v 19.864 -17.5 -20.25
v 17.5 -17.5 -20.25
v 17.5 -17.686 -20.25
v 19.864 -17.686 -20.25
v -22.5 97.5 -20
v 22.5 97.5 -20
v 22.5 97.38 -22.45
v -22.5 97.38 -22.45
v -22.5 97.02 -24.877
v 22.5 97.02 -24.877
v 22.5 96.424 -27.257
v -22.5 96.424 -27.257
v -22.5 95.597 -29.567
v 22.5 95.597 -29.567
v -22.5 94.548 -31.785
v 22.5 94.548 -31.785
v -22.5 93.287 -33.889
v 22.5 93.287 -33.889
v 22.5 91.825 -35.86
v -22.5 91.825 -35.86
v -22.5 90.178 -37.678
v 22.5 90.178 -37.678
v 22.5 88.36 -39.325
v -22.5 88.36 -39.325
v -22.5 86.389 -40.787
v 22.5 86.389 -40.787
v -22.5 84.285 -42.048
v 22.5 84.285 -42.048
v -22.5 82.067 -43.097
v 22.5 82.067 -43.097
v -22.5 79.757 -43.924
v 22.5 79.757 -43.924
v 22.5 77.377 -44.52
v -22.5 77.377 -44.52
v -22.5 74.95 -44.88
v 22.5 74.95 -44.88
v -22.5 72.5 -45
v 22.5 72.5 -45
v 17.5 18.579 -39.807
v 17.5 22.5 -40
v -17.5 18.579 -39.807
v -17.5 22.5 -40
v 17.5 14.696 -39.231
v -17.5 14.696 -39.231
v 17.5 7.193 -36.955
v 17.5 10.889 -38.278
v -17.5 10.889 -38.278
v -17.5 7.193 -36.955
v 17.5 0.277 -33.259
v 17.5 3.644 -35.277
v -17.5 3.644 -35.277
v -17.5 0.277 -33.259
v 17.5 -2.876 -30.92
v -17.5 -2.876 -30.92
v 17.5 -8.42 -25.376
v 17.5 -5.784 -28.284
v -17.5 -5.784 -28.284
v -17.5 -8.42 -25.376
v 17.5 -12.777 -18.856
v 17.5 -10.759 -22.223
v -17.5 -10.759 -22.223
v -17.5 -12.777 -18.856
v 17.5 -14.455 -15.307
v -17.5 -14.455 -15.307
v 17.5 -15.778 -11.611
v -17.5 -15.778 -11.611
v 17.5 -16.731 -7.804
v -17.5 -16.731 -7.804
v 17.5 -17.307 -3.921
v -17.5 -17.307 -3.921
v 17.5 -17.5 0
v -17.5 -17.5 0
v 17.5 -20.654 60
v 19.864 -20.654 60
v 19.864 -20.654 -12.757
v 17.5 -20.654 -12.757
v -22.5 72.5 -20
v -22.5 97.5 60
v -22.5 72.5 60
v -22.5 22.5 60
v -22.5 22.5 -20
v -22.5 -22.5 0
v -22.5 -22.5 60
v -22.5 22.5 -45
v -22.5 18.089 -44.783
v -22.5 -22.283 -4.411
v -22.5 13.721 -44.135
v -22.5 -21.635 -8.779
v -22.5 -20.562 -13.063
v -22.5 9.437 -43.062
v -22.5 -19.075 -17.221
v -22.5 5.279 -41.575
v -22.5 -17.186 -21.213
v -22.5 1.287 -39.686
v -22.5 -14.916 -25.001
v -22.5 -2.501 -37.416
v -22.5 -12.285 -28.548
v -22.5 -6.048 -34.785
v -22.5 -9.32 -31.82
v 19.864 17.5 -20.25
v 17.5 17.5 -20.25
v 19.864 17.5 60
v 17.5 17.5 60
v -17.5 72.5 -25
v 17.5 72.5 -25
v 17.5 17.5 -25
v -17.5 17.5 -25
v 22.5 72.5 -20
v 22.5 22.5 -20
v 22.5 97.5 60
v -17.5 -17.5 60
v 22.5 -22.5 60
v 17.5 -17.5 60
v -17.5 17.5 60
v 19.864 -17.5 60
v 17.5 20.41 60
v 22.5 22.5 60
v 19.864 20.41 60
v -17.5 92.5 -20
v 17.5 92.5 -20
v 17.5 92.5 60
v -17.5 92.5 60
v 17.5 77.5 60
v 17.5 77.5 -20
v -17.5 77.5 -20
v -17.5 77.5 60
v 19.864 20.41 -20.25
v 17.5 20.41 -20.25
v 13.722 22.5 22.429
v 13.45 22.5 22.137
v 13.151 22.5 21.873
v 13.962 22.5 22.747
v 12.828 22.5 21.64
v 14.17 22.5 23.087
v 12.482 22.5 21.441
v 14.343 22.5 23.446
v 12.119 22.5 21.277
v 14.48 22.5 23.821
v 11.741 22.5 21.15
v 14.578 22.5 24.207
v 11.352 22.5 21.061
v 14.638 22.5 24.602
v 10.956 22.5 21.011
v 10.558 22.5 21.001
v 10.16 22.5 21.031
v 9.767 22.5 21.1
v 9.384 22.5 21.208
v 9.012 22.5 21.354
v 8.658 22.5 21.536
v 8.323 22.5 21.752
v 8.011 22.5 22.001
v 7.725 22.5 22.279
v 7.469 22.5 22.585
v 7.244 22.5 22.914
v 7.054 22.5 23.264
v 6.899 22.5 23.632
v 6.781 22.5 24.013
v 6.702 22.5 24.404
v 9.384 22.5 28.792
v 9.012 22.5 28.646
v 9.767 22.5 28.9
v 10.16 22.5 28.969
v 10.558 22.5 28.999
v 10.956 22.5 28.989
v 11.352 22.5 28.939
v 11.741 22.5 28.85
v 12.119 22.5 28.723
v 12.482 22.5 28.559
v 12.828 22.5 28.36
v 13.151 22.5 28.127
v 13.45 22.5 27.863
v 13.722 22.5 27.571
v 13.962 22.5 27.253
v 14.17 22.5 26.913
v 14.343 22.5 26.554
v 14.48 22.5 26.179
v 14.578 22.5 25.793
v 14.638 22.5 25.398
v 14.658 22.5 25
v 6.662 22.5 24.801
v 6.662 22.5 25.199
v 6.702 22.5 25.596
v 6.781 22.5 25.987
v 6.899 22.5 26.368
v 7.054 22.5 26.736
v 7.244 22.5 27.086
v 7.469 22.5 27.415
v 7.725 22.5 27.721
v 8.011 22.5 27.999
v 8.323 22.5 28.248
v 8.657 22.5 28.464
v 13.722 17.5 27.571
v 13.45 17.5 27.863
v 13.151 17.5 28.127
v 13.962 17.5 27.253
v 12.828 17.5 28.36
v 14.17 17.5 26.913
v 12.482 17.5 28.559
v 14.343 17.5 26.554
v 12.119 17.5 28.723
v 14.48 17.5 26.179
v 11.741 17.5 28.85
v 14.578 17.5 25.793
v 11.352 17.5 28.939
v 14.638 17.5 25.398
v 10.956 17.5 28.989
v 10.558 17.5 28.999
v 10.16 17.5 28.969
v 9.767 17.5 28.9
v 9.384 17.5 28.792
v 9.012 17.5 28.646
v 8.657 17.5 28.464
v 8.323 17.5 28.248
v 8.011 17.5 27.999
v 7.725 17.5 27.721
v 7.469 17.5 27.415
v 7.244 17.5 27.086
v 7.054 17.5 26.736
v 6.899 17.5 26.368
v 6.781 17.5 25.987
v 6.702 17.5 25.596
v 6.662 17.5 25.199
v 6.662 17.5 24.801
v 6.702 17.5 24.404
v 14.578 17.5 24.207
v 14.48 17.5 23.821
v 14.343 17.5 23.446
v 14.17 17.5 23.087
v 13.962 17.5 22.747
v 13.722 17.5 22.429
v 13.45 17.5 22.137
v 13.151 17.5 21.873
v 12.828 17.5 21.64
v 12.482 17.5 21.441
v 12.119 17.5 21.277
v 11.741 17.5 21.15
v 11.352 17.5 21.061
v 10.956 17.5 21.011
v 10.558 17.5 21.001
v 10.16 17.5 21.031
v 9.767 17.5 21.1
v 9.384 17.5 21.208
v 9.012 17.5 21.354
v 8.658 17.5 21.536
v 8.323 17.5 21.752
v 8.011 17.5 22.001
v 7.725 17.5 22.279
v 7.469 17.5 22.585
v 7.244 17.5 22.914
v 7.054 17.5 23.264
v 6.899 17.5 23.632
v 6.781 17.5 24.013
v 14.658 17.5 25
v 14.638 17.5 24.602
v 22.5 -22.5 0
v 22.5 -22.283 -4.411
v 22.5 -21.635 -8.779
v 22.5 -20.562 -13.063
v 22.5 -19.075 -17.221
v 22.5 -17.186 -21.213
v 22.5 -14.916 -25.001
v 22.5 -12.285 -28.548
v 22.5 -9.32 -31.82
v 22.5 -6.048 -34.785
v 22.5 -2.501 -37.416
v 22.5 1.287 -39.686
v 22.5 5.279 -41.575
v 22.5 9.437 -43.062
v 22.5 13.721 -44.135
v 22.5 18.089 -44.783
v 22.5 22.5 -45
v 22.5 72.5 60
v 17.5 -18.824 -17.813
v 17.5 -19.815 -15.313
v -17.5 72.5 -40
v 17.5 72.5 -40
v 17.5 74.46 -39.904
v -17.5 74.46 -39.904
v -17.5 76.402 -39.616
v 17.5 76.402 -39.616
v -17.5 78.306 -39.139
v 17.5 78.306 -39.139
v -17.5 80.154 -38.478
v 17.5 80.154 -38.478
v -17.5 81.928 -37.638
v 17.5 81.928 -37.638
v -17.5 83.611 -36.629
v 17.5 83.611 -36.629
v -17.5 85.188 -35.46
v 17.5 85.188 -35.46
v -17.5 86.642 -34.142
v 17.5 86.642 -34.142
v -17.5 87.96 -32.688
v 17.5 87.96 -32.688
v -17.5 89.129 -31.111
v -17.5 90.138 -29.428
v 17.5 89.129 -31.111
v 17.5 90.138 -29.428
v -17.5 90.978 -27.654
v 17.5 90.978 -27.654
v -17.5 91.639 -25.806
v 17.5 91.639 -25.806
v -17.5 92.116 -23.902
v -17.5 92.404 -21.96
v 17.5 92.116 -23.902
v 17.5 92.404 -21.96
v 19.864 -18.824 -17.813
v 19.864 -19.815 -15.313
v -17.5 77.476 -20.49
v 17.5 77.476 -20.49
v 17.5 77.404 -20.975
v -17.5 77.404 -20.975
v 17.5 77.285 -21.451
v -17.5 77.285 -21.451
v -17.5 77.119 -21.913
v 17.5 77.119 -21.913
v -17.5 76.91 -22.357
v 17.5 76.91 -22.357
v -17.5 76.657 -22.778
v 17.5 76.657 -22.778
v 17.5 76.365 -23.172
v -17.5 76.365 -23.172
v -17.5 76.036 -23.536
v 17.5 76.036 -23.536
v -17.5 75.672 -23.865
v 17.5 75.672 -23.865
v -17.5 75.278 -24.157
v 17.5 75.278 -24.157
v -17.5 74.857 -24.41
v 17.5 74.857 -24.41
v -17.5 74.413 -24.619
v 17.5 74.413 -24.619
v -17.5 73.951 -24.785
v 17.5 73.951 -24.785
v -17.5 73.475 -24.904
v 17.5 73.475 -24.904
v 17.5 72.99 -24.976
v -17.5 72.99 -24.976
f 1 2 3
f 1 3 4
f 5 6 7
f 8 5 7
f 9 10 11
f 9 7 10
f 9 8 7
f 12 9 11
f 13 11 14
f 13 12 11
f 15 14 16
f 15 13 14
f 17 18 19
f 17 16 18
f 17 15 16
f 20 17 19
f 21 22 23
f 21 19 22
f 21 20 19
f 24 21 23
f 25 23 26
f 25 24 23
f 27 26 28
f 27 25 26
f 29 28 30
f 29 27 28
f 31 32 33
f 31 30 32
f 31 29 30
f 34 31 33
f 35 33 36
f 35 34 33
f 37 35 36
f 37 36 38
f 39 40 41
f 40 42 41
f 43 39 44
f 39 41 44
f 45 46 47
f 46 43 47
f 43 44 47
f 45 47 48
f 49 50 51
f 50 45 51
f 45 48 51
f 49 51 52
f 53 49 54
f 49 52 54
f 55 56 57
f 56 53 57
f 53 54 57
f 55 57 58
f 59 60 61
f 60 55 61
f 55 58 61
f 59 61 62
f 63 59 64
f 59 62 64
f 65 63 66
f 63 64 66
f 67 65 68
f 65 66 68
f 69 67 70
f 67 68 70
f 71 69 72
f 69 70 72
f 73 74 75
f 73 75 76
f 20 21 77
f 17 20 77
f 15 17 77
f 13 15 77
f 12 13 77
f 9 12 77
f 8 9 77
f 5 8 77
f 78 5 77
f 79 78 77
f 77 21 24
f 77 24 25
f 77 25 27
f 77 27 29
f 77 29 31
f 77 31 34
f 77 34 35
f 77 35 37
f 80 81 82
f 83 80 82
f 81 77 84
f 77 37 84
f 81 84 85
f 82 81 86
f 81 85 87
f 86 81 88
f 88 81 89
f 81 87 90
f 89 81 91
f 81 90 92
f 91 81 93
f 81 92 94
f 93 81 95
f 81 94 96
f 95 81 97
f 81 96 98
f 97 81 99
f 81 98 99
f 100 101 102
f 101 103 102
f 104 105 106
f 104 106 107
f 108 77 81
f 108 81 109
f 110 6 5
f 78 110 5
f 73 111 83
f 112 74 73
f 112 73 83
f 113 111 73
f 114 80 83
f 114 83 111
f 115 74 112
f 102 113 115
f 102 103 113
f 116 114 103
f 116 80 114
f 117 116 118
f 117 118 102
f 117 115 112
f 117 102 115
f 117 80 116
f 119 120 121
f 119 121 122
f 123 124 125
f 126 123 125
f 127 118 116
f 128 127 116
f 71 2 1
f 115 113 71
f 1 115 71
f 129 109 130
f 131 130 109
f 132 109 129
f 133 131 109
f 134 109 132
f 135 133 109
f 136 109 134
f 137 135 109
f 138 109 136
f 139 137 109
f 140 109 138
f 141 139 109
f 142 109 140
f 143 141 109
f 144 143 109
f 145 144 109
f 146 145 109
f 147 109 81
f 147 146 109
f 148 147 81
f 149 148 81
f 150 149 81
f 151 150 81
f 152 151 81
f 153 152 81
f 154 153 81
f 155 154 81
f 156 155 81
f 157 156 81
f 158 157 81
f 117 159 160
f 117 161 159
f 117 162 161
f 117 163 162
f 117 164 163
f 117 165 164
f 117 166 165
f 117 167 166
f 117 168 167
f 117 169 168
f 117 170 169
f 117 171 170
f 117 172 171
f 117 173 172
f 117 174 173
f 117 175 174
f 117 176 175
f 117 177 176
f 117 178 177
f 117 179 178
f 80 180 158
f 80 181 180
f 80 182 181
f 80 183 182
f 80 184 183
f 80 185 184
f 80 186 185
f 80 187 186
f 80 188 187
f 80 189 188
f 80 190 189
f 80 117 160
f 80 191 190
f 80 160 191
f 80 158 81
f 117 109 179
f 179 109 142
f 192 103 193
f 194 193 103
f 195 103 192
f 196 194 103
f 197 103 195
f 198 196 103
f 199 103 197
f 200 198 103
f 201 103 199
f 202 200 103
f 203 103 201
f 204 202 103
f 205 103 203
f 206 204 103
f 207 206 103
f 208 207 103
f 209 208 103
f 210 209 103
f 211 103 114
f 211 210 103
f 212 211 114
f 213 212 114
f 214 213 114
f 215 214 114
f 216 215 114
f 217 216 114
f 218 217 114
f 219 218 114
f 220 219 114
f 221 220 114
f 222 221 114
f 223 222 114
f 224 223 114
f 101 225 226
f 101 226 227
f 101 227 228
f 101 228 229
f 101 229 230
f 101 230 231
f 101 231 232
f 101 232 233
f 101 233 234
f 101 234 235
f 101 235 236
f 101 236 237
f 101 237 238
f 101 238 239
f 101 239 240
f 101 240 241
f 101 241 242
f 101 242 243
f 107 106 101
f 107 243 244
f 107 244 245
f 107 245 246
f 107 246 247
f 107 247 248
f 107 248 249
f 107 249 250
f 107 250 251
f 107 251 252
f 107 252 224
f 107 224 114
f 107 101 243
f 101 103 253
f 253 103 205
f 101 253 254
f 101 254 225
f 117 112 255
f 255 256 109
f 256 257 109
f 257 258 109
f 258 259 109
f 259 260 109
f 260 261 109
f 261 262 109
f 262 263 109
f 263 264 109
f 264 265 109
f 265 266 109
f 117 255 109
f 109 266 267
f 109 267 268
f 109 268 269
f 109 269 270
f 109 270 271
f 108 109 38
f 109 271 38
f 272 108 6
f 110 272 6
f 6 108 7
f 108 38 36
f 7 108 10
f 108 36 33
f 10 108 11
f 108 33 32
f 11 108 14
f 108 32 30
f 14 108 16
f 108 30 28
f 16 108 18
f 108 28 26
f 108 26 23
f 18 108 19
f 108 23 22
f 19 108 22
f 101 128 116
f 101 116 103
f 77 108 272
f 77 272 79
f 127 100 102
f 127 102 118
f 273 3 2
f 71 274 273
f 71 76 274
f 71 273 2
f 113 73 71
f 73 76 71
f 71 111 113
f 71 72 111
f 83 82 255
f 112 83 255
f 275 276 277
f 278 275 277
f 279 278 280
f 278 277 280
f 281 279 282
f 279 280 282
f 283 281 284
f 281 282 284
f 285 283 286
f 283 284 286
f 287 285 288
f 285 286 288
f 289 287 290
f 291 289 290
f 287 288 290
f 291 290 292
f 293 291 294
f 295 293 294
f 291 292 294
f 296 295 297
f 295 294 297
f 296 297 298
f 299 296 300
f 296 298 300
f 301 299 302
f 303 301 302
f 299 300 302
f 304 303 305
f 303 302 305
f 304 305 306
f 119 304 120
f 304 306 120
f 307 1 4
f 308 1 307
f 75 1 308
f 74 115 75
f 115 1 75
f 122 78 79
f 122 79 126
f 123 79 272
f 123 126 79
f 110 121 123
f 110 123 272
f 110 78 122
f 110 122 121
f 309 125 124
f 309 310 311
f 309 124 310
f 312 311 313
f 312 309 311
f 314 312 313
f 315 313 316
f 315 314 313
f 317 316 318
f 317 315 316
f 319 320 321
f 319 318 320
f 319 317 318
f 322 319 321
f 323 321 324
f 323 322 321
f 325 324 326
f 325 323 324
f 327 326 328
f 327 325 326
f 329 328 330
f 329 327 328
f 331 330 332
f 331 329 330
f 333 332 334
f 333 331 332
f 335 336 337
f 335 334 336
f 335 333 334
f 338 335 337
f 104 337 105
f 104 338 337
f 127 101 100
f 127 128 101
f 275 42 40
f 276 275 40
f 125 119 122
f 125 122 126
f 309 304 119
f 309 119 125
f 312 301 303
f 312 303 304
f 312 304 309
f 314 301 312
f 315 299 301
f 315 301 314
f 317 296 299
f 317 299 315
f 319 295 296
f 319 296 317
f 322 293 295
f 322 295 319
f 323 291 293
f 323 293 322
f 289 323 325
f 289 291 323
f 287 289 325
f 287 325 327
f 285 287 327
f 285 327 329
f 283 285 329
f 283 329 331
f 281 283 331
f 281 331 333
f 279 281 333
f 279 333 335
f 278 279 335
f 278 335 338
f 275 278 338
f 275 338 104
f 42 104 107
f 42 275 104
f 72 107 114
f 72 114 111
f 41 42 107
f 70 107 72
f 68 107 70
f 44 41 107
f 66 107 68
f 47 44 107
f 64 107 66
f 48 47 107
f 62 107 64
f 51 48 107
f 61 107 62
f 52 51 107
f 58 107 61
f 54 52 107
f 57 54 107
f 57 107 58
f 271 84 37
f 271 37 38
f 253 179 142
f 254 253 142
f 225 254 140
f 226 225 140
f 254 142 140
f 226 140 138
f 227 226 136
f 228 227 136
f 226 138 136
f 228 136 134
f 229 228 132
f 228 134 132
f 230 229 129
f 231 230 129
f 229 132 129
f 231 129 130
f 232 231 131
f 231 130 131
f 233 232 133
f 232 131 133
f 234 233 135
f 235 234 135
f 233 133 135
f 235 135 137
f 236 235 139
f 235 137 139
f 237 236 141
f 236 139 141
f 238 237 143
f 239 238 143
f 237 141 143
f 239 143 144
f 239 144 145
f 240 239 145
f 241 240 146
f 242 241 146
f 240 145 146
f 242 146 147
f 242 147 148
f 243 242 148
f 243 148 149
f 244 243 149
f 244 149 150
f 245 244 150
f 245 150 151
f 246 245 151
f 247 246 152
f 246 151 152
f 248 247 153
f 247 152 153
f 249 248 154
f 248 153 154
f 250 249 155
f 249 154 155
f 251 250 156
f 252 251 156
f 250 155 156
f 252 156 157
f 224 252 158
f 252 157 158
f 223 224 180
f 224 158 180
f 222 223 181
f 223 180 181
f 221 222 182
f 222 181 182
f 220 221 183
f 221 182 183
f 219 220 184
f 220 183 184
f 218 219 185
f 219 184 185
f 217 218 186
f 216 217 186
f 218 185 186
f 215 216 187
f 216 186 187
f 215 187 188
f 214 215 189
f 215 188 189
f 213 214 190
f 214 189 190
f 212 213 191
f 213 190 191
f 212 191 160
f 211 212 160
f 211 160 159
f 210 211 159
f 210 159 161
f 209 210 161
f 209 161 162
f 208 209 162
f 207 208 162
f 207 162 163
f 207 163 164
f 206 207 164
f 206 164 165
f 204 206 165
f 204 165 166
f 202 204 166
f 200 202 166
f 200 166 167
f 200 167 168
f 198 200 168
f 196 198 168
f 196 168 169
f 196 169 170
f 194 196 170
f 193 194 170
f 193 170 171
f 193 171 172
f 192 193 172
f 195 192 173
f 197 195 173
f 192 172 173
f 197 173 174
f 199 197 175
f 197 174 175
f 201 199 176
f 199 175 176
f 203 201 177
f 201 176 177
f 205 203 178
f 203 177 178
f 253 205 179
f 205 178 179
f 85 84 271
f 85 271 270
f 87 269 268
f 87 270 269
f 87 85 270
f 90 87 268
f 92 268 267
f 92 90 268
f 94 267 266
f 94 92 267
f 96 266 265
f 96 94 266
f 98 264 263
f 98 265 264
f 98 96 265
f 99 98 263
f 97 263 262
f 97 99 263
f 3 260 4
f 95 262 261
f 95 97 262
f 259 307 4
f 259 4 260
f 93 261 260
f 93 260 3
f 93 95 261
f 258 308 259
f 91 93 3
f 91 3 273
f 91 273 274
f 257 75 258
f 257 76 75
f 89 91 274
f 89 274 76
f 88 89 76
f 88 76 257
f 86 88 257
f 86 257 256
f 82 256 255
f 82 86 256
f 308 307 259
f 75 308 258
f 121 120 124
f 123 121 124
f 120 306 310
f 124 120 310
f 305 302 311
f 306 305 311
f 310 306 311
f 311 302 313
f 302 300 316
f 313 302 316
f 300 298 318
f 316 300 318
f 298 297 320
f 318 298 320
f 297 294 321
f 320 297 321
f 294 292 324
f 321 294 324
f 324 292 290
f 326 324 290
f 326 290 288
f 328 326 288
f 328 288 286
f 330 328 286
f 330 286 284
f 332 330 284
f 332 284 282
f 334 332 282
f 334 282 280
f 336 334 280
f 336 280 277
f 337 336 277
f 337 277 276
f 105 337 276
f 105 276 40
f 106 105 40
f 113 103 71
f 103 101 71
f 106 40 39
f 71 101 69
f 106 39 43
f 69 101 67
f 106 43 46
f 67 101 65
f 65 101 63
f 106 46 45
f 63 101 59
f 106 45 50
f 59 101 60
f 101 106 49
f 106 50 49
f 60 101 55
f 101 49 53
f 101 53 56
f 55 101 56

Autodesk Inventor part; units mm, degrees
ref_plane "YZ Plane" through (0, 0, 0) normal (1, 0, 0) x (0, 1, 0)
ref_plane "XZ Plane" through (0, 0, 0) normal (0, 1, 0) x (-1, 0, 0)
ref_plane "XY Plane" through (0, 0, 0) normal (0, 0, 1) x (1, 0, 0)
sketch "Sketch1" plane through (0, 0, 0) normal (0, 0, 1) x (1, 0, 0)
  line L0 (-22.5, -22.5) -> (22.5, -22.5)
  line L1 (22.5, -22.5) -> (22.5, 22.5)
  line L2 (22.5, 22.5) -> (-22.5, 22.5)
  line L3 (-22.5, 22.5) -> (-22.5, -22.5)
  line L4 (-22.5, -22.5) -> (22.5, 22.5) construction
  line L5 (22.5, -22.5) -> (-22.5, 22.5) construction
  line L6 (-17.5, -17.5) -> (17.5, -17.5)
  line L7 (17.5, -17.5) -> (17.5, 17.5)
  line L8 (17.5, 17.5) -> (-17.5, 17.5)
  line L9 (-17.5, 17.5) -> (-17.5, -17.5)
  line L10 (-17.5, -17.5) -> (17.5, 17.5) construction
  line L11 (17.5, -17.5) -> (-17.5, 17.5) construction
  line L12 (-22.5, 17.5) -> (22.5, 17.5)
  point P0 (0, 0)
  dimension "d0" = 45
  dimension "d20" = 5
  dimension "d21" = 5
extrude "Extrusion1" add sketch "Sketch1" along normal blind 60 contours L3 L12 L9 L6 L7 L1 L0 | L3 L2 L1 L12 L8
sketch "Sketch2" plane through (0, 0, 0) normal (0, 0, -1) x (-1, 0, 0)
  line L0 (17.5, -17.5) -> (17.5, 17.5) projected
  line L1 (-17.5, -17.5) -> (17.5, -17.5)
  line L2 (17.5, -17.5) -> (17.5, 17.5)
  line L3 (17.5, 17.5) -> (-17.5, 17.5)
  line L4 (-17.5, 17.5) -> (-17.5, -17.5)
  line L5 (-17.5, -17.5) -> (17.5, 17.5) construction
  line L6 (17.5, -17.5) -> (-17.5, 17.5) construction
  line L7 (-22.5, 22.5) -> (22.5, 22.5) projected
  line L8 (-22.5, -22.5) -> (22.5, -22.5)
  line L9 (22.5, -22.5) -> (22.5, 22.5)
  line L10 (22.5, 22.5) -> (-22.5, 22.5)
  line L11 (-22.5, 22.5) -> (-22.5, -22.5)
  line L12 (-22.5, -22.5) -> (22.5, 22.5) construction
  line L13 (22.5, -22.5) -> (-22.5, 22.5) construction
  line L14 (-39.1057, 22.5) -> (57.4203, 22.5)
  point P0 (0, 0)
  dimension "d18" = 5
  dimension "d19" = 5
revolve "Revolution1" add sketch "Sketch2" angle 90 about axis through (39.1057, 22.5, 0) along (1, 0, 0)
sketch "Sketch3" plane through (-22.5, 22.5, 60) normal (0, 1, 0) x (1, 0, 0)
  line L0 (5, 65) -> (5, 100) projected
  line L1 (40, 85) -> (5, 85)
  line L2 (5, 85) -> (5, 100)
  line L3 (5, 100) -> (40, 100)
  line L4 (35.2339, 98.1928) -> (5, 100) construction
  line L5 (5, 85) -> (35.2339, 113.1928) construction
  line L6 (0, 60) -> (0, 105) projected
  line L7 (45, 80) -> (0, 80)
  line L8 (0, 80) -> (0, 105)
  line L9 (0, 105) -> (45, 105)
  line L10 (40.2339, 93.1928) -> (0, 105) construction
  line L11 (0, 80) -> (45, 122.7171) construction
  line L12 (40, 100) -> (40, 65) projected
  line L13 (40, 100) -> (40, 85)
  line L14 (45, 105) -> (45, 0) projected
  line L15 (45, 105) -> (45, 80)
  point P0 (22.5, 60)
  point P1 (20.117, 99.0964)
  point P2 (43.816, 121.1954)
  point P3 (20.117, 99.0964)
  point P4 (0, 80)
  point P5 (5, 85)
  dimension "d17" = 15
extrude "Extrusion2" add sketch "Sketch3" along normal blind 50
extrude "Extrusion4" add sketch "Sketch1" against normal blind 25 contours L3 L2 L1 L12 L8
extrude "Extrusion5" cut sketch "Sketch3" along normal blind 75.5 contours L0 L3 L12 L1
sketch "Sketch10" plane through (-22.5, 72.5, 60) normal (0, 1, 0) x (1, 0, 0)
  line L0 (45, 105) -> (0, 105)
  line L1 (0, 105) -> (0, 80)
  line L2 (0, 80) -> (45, 80)
  line L3 (45, 80) -> (45, 105)
  line L4 (5, 100) -> (40, 100) projected
  line L5 (40, 85) -> (5, 85) projected
  line L6 (40, 100) -> (5, 100)
  line L7 (5, 100) -> (5, 85)
  line L8 (5, 85) -> (40, 85)
  line L9 (40, 85) -> (40, 100)
  line L10 (-3.6161, 80) -> (47.5585, 80)
revolve "Revolution3" add sketch "Sketch10" angle 90 about axis through (-26.1161, 72.5, -20) along (1, 0, 0)
sketch "Sketch11" plane through (-22.5, 22.5, -20) normal (0, 0, 1) x (1, 0, 0)
  line L0 (45, 75) -> (0, 75) projected
  line L1 (45, 50) -> (0, 50) projected
  line L2 (45, 75) -> (0, 75)
  line L3 (0, 75) -> (0, 50)
  line L4 (0, 50) -> (45, 50)
  line L5 (45, 50) -> (45, 75)
  line L6 (40, 70) -> (40, 55) projected
  line L7 (40, 55) -> (5, 55) projected
  line L8 (40, 70) -> (5, 70)
  line L9 (5, 70) -> (5, 55)
  line L10 (5, 55) -> (40, 55)
  line L11 (40, 55) -> (40, 70)
  point P0 (22.5, -22.5)
  dimension "d68" = 15
extrude "Extrusion8" add sketch "Sketch11" along normal blind 80
sketch "Sketch12" plane through (-22.5, 22.5, 60) normal (0, 1, 0) x (1, 0, 0)
  point P0 (22.5, 60)
sketch "Sketch13" plane through (0, 0, 60) normal (0, 0, 1) x (1, 0, 0)
  line L0 (17.5, 17.5) -> (17.5, -17.5) projected
  line L1 (17.5, 17.5) -> (19.8638, 17.5)
  line L2 (19.8638, 17.5) -> (19.8638, 20.41)
  line L3 (19.8638, 20.41) -> (17.5, 20.41)
  line L4 (17.5, 20.41) -> (17.5, 17.5)
  line L5 (17.5, -17.5) -> (19.8638, -17.5)
  line L6 (19.8638, -17.5) -> (19.8638, -20.6538)
  line L7 (19.8638, -20.6538) -> (17.5, -20.6538)
  line L8 (17.5, -20.6538) -> (17.5, -17.5)
  point P0 (0, 0)
extrude "Extrusion9" cut sketch "Sketch13" against normal blind 80.25
sketch "Sketch14" plane through (-22.5, 22.5, 60) normal (0, 1, 0) x (1, 0, 0)
  circle A0 centre (33.1575, 35) radius 4
  line L0 (45, 0) -> (0, 0) projected
  point P0 (22.5, 60)
  dimension "d72" = 8
  dimension "d73" = 35
extrude "Extrusion10" cut sketch "Sketch14" against normal blind 28.5
properties material "Iron, Malleable"
